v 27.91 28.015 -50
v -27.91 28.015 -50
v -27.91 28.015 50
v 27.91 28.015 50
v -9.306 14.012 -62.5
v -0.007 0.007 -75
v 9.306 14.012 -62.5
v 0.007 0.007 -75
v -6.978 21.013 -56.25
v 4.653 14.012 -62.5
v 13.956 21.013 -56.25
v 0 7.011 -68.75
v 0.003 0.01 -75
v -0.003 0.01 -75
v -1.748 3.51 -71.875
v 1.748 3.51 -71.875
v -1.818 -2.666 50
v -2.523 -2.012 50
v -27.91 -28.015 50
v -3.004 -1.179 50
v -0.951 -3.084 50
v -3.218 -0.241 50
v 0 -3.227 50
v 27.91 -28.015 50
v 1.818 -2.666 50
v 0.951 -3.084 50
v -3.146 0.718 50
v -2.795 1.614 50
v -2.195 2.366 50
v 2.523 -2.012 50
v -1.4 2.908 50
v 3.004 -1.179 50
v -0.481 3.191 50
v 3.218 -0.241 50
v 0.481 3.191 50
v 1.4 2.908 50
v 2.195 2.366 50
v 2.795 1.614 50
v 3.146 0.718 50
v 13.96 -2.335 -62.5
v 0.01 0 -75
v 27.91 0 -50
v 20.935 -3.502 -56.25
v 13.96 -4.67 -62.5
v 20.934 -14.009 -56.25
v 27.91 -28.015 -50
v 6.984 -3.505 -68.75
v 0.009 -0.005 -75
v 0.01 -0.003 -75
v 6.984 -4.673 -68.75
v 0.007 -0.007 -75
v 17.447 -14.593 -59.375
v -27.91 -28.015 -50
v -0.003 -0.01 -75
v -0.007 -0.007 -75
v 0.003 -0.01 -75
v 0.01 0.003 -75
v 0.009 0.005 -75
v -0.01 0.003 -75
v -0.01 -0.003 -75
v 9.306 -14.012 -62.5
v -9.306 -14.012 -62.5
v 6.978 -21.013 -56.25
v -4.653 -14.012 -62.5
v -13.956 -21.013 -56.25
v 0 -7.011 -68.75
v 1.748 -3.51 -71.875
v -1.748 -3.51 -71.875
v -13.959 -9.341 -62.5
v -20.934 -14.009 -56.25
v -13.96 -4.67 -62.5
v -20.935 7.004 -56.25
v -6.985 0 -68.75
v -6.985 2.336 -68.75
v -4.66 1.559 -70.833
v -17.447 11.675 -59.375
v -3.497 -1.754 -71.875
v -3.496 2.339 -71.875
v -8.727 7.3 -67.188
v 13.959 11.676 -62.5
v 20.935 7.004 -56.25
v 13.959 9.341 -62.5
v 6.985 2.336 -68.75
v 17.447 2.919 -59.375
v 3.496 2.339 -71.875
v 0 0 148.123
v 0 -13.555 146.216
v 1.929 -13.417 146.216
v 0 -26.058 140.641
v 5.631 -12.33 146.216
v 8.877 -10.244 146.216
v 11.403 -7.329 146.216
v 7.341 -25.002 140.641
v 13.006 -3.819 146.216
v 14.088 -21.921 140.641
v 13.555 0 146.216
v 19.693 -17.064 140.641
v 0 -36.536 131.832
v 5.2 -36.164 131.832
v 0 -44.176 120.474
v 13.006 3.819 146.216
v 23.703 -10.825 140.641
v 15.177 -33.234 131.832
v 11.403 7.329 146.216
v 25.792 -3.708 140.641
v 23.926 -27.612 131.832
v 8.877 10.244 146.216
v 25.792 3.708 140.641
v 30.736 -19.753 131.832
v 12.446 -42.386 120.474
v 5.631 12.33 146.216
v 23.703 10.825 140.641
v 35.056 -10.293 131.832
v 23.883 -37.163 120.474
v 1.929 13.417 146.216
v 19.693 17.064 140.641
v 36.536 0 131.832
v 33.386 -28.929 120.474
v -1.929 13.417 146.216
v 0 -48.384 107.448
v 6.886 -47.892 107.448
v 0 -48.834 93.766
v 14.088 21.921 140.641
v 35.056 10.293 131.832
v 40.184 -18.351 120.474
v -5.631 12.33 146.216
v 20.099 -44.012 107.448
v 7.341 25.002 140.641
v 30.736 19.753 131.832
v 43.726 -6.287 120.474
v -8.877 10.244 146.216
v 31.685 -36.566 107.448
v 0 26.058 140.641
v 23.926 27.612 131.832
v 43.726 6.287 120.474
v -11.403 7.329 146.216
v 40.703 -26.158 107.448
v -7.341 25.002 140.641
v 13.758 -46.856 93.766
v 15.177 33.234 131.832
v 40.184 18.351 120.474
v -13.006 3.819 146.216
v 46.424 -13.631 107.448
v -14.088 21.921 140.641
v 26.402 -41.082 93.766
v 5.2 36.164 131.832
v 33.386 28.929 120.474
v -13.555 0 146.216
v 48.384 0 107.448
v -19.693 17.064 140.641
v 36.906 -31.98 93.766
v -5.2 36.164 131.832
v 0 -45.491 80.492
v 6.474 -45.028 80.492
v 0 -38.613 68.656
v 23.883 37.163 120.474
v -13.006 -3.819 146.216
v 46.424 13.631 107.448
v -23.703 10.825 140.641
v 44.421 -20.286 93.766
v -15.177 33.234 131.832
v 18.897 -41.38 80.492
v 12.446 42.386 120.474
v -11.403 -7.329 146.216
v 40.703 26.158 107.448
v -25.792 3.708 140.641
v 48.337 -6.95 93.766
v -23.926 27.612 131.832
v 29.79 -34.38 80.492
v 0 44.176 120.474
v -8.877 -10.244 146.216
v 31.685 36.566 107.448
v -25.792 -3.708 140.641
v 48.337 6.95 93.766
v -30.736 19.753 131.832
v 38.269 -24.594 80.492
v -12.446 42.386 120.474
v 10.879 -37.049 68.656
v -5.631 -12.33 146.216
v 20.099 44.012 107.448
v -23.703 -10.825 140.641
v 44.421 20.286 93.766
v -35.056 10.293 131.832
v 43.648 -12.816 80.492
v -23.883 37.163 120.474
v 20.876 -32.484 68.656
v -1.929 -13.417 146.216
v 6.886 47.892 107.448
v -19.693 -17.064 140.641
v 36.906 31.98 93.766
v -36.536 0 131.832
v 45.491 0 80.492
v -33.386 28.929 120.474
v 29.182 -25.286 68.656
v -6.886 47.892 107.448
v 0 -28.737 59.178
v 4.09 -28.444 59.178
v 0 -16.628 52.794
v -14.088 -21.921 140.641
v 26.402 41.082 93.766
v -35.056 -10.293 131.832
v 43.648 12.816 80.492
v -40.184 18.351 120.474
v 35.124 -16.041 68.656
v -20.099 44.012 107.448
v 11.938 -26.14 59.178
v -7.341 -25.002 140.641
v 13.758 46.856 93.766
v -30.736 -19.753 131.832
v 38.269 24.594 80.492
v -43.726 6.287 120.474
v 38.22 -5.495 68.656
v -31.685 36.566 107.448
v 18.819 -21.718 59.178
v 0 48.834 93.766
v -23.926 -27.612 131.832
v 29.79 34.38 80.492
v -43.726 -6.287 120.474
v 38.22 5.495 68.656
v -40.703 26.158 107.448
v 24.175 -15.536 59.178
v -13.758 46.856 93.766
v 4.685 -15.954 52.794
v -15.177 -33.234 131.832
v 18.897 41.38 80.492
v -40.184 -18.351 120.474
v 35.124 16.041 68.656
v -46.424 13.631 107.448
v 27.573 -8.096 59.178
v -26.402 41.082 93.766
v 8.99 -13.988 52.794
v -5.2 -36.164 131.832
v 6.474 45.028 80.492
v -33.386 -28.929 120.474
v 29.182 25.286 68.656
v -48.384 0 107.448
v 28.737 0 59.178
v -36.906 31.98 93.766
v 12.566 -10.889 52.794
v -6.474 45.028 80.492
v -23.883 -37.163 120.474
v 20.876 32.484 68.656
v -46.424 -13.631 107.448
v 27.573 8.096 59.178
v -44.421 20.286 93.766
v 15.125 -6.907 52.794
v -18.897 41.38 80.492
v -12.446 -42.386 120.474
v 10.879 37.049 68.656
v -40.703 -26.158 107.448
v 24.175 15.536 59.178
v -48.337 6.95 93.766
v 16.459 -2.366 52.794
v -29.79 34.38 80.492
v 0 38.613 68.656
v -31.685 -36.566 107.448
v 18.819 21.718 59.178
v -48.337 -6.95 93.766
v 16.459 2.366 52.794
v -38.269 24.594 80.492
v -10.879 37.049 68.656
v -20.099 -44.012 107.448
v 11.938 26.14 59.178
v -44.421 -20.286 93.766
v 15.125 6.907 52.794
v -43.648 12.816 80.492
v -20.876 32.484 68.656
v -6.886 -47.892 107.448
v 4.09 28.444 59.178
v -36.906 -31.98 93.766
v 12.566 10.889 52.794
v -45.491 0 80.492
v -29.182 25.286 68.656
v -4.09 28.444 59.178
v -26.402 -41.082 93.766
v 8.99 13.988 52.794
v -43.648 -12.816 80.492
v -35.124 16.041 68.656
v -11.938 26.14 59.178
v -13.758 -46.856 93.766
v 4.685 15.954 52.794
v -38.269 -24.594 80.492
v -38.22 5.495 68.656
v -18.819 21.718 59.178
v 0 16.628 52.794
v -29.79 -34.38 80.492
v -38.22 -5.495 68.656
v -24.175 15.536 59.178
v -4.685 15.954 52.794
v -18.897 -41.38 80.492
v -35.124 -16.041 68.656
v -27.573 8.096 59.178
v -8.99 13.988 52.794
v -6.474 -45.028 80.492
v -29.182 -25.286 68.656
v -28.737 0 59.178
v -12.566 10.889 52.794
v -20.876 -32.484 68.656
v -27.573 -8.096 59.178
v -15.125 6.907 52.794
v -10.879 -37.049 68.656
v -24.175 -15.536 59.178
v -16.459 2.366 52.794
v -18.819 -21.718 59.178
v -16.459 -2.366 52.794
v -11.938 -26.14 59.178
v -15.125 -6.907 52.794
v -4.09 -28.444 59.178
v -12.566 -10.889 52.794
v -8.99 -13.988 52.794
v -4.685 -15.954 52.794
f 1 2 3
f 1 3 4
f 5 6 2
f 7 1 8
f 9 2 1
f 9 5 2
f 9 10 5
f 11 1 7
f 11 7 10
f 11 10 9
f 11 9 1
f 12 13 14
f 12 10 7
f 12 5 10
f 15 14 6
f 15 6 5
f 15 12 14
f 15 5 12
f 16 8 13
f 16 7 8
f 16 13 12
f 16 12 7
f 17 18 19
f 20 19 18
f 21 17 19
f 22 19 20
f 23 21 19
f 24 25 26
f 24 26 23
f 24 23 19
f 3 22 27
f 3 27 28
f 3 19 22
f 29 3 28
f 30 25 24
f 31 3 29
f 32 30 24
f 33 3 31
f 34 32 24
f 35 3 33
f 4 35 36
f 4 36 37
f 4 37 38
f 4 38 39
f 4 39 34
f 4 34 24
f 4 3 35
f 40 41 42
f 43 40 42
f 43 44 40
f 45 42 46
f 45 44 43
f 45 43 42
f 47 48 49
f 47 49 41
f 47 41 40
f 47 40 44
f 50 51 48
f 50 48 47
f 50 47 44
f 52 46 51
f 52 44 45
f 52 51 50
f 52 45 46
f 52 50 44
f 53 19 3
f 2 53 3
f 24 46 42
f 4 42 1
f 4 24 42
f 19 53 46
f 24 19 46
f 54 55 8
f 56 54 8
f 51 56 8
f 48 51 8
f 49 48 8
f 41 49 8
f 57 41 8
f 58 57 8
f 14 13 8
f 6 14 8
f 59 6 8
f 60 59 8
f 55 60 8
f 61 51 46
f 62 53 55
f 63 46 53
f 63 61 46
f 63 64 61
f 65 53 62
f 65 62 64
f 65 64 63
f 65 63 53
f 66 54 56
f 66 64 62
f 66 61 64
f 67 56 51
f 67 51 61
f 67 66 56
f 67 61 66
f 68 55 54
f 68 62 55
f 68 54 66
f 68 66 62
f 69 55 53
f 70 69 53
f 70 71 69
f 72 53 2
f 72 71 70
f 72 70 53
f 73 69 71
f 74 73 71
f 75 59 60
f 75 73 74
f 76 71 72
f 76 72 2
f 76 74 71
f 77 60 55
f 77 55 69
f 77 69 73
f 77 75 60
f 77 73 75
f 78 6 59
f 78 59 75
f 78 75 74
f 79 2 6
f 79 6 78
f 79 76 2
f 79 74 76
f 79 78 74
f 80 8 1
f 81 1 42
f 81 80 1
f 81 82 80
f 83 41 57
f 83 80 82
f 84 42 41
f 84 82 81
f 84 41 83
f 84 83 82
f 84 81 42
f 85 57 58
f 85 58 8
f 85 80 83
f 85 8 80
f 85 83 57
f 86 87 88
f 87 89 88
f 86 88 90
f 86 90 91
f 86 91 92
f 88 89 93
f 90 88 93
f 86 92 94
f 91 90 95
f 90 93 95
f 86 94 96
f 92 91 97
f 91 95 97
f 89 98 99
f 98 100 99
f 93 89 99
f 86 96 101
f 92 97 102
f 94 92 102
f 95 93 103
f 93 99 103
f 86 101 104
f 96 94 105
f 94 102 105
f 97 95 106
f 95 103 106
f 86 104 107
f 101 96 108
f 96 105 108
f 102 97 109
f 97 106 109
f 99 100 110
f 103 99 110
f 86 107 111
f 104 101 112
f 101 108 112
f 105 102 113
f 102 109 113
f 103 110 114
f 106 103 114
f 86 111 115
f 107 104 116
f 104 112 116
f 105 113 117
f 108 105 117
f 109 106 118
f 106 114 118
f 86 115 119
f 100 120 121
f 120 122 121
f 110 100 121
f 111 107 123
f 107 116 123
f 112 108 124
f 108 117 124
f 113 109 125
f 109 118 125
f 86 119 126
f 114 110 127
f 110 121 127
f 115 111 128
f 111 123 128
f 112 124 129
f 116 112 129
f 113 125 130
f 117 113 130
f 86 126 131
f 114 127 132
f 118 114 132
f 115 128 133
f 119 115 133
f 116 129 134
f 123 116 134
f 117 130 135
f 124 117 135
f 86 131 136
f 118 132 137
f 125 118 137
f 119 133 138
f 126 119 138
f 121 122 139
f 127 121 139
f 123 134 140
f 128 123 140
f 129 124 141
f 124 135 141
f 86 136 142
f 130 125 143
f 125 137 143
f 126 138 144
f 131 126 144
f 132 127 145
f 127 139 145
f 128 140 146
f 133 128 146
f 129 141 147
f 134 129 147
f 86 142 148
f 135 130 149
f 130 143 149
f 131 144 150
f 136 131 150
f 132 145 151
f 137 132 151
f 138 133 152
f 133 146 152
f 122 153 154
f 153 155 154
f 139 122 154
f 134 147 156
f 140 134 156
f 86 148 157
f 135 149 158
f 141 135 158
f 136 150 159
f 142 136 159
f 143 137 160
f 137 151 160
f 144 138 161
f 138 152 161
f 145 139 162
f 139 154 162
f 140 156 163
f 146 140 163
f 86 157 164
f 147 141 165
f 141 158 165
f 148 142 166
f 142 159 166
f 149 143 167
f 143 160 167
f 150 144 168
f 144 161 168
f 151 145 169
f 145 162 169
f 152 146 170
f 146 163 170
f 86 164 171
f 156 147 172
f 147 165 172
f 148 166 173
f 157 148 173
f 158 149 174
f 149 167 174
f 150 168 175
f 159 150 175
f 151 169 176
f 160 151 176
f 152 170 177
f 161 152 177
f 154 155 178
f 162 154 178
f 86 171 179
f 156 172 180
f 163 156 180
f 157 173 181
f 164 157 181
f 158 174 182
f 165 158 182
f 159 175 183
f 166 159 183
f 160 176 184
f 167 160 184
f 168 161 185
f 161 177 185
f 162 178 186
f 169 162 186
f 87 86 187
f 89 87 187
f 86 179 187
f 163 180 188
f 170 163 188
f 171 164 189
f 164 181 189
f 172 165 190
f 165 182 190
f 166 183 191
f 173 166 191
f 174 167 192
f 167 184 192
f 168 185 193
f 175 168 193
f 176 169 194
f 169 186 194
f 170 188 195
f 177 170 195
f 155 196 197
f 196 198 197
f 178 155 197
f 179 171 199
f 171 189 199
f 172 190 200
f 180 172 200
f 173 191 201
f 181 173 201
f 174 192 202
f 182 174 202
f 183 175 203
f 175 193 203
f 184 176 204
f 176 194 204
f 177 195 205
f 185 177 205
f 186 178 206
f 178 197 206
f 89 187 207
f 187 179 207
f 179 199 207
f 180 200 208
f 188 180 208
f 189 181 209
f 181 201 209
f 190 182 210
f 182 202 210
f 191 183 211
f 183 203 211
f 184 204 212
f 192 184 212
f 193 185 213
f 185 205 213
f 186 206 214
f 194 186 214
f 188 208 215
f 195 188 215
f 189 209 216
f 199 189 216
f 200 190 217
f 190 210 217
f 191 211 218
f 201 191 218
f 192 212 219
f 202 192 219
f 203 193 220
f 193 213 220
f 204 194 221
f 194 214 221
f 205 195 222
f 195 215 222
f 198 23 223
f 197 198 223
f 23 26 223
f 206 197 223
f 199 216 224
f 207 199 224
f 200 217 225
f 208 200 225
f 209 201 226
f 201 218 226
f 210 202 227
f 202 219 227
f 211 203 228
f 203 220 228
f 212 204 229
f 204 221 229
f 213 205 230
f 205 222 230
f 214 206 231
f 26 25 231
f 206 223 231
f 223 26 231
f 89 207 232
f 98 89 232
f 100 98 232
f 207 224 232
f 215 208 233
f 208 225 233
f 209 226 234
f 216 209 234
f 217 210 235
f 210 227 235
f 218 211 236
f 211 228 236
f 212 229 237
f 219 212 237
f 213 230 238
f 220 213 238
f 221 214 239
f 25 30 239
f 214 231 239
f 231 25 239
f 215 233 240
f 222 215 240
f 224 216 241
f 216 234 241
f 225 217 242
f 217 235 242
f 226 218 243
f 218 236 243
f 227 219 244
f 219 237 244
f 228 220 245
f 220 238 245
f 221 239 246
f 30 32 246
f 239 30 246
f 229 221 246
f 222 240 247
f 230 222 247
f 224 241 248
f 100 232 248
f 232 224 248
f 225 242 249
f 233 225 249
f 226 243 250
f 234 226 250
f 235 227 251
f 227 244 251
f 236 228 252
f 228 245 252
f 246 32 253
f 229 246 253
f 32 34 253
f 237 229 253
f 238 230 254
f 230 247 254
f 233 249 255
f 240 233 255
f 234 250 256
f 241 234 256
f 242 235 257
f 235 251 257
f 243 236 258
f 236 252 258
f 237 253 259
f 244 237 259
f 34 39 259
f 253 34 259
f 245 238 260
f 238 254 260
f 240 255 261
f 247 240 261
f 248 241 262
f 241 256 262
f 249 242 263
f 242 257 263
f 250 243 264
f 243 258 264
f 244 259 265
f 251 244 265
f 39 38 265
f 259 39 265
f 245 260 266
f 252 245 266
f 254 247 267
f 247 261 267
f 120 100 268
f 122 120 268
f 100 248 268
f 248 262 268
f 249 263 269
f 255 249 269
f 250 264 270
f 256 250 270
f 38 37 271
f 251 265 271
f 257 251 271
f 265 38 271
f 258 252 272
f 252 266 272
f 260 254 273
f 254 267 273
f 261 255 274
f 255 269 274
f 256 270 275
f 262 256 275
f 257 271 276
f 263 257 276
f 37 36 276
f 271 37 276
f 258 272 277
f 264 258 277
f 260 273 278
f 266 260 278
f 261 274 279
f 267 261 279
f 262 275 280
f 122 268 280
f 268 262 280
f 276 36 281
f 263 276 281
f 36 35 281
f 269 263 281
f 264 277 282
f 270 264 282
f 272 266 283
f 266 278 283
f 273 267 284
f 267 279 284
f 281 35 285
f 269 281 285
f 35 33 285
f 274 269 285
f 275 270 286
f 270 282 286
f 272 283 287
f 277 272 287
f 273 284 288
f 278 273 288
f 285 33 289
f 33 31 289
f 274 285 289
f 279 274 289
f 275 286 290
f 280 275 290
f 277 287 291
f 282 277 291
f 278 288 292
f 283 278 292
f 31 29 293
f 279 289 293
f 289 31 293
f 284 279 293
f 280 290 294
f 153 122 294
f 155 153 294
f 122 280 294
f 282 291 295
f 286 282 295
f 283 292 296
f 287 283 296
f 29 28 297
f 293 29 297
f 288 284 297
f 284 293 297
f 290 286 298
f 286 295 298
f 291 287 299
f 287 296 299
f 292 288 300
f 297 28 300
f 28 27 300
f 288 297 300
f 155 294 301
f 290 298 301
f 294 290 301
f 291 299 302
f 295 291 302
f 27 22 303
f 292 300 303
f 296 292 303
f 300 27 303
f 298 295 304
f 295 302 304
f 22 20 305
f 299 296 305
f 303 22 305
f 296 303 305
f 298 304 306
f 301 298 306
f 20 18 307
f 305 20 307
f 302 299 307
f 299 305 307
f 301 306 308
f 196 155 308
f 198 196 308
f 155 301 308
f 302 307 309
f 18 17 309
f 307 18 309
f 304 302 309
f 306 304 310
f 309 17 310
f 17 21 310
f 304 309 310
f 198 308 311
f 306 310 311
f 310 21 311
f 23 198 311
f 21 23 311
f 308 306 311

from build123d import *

# Parameters (mm, degrees)
F0_W      = 55.819296
F0_H      = 56.029066
F1_DEPTH  = 50
F1_FACE_W = 55.819296
F1_FACE_H = 56.029066
F5_R      = 0.01


with BuildPart() as f1:
    # F0 (on Top) → F1 (new body, symmetric)
    with BuildSketch(Plane.XY):
        Rectangle(F0_W, F0_H)
    extrude(amount=F1_DEPTH, both=True)

    # F2 (on Right) → F3 (revolve)
    with BuildSketch(Plane.YZ):
        with BuildLine():
            Line((0, 49.893861), (0, 148.123125))
            ThreePointArc((0, 148.123125), (-49.114632, 99.008493), (0, 49.893861))
        make_face()
    revolve(axis=Axis((0, 0, 99.008493), (0, 0, 1)))

    # F1_face (on face) → F6 section 0
    with BuildSketch(Plane(origin=(0, 0, -50), x_dir=(1, 0, 0), z_dir=(0, 0, -1))):
        Rectangle(F1_FACE_W, F1_FACE_H)
    # F5 (on offset) → F6 section 1
    with BuildSketch(Plane.XY.offset(-75)):
        Circle(F5_R)
    loft()


solid = f1.part
